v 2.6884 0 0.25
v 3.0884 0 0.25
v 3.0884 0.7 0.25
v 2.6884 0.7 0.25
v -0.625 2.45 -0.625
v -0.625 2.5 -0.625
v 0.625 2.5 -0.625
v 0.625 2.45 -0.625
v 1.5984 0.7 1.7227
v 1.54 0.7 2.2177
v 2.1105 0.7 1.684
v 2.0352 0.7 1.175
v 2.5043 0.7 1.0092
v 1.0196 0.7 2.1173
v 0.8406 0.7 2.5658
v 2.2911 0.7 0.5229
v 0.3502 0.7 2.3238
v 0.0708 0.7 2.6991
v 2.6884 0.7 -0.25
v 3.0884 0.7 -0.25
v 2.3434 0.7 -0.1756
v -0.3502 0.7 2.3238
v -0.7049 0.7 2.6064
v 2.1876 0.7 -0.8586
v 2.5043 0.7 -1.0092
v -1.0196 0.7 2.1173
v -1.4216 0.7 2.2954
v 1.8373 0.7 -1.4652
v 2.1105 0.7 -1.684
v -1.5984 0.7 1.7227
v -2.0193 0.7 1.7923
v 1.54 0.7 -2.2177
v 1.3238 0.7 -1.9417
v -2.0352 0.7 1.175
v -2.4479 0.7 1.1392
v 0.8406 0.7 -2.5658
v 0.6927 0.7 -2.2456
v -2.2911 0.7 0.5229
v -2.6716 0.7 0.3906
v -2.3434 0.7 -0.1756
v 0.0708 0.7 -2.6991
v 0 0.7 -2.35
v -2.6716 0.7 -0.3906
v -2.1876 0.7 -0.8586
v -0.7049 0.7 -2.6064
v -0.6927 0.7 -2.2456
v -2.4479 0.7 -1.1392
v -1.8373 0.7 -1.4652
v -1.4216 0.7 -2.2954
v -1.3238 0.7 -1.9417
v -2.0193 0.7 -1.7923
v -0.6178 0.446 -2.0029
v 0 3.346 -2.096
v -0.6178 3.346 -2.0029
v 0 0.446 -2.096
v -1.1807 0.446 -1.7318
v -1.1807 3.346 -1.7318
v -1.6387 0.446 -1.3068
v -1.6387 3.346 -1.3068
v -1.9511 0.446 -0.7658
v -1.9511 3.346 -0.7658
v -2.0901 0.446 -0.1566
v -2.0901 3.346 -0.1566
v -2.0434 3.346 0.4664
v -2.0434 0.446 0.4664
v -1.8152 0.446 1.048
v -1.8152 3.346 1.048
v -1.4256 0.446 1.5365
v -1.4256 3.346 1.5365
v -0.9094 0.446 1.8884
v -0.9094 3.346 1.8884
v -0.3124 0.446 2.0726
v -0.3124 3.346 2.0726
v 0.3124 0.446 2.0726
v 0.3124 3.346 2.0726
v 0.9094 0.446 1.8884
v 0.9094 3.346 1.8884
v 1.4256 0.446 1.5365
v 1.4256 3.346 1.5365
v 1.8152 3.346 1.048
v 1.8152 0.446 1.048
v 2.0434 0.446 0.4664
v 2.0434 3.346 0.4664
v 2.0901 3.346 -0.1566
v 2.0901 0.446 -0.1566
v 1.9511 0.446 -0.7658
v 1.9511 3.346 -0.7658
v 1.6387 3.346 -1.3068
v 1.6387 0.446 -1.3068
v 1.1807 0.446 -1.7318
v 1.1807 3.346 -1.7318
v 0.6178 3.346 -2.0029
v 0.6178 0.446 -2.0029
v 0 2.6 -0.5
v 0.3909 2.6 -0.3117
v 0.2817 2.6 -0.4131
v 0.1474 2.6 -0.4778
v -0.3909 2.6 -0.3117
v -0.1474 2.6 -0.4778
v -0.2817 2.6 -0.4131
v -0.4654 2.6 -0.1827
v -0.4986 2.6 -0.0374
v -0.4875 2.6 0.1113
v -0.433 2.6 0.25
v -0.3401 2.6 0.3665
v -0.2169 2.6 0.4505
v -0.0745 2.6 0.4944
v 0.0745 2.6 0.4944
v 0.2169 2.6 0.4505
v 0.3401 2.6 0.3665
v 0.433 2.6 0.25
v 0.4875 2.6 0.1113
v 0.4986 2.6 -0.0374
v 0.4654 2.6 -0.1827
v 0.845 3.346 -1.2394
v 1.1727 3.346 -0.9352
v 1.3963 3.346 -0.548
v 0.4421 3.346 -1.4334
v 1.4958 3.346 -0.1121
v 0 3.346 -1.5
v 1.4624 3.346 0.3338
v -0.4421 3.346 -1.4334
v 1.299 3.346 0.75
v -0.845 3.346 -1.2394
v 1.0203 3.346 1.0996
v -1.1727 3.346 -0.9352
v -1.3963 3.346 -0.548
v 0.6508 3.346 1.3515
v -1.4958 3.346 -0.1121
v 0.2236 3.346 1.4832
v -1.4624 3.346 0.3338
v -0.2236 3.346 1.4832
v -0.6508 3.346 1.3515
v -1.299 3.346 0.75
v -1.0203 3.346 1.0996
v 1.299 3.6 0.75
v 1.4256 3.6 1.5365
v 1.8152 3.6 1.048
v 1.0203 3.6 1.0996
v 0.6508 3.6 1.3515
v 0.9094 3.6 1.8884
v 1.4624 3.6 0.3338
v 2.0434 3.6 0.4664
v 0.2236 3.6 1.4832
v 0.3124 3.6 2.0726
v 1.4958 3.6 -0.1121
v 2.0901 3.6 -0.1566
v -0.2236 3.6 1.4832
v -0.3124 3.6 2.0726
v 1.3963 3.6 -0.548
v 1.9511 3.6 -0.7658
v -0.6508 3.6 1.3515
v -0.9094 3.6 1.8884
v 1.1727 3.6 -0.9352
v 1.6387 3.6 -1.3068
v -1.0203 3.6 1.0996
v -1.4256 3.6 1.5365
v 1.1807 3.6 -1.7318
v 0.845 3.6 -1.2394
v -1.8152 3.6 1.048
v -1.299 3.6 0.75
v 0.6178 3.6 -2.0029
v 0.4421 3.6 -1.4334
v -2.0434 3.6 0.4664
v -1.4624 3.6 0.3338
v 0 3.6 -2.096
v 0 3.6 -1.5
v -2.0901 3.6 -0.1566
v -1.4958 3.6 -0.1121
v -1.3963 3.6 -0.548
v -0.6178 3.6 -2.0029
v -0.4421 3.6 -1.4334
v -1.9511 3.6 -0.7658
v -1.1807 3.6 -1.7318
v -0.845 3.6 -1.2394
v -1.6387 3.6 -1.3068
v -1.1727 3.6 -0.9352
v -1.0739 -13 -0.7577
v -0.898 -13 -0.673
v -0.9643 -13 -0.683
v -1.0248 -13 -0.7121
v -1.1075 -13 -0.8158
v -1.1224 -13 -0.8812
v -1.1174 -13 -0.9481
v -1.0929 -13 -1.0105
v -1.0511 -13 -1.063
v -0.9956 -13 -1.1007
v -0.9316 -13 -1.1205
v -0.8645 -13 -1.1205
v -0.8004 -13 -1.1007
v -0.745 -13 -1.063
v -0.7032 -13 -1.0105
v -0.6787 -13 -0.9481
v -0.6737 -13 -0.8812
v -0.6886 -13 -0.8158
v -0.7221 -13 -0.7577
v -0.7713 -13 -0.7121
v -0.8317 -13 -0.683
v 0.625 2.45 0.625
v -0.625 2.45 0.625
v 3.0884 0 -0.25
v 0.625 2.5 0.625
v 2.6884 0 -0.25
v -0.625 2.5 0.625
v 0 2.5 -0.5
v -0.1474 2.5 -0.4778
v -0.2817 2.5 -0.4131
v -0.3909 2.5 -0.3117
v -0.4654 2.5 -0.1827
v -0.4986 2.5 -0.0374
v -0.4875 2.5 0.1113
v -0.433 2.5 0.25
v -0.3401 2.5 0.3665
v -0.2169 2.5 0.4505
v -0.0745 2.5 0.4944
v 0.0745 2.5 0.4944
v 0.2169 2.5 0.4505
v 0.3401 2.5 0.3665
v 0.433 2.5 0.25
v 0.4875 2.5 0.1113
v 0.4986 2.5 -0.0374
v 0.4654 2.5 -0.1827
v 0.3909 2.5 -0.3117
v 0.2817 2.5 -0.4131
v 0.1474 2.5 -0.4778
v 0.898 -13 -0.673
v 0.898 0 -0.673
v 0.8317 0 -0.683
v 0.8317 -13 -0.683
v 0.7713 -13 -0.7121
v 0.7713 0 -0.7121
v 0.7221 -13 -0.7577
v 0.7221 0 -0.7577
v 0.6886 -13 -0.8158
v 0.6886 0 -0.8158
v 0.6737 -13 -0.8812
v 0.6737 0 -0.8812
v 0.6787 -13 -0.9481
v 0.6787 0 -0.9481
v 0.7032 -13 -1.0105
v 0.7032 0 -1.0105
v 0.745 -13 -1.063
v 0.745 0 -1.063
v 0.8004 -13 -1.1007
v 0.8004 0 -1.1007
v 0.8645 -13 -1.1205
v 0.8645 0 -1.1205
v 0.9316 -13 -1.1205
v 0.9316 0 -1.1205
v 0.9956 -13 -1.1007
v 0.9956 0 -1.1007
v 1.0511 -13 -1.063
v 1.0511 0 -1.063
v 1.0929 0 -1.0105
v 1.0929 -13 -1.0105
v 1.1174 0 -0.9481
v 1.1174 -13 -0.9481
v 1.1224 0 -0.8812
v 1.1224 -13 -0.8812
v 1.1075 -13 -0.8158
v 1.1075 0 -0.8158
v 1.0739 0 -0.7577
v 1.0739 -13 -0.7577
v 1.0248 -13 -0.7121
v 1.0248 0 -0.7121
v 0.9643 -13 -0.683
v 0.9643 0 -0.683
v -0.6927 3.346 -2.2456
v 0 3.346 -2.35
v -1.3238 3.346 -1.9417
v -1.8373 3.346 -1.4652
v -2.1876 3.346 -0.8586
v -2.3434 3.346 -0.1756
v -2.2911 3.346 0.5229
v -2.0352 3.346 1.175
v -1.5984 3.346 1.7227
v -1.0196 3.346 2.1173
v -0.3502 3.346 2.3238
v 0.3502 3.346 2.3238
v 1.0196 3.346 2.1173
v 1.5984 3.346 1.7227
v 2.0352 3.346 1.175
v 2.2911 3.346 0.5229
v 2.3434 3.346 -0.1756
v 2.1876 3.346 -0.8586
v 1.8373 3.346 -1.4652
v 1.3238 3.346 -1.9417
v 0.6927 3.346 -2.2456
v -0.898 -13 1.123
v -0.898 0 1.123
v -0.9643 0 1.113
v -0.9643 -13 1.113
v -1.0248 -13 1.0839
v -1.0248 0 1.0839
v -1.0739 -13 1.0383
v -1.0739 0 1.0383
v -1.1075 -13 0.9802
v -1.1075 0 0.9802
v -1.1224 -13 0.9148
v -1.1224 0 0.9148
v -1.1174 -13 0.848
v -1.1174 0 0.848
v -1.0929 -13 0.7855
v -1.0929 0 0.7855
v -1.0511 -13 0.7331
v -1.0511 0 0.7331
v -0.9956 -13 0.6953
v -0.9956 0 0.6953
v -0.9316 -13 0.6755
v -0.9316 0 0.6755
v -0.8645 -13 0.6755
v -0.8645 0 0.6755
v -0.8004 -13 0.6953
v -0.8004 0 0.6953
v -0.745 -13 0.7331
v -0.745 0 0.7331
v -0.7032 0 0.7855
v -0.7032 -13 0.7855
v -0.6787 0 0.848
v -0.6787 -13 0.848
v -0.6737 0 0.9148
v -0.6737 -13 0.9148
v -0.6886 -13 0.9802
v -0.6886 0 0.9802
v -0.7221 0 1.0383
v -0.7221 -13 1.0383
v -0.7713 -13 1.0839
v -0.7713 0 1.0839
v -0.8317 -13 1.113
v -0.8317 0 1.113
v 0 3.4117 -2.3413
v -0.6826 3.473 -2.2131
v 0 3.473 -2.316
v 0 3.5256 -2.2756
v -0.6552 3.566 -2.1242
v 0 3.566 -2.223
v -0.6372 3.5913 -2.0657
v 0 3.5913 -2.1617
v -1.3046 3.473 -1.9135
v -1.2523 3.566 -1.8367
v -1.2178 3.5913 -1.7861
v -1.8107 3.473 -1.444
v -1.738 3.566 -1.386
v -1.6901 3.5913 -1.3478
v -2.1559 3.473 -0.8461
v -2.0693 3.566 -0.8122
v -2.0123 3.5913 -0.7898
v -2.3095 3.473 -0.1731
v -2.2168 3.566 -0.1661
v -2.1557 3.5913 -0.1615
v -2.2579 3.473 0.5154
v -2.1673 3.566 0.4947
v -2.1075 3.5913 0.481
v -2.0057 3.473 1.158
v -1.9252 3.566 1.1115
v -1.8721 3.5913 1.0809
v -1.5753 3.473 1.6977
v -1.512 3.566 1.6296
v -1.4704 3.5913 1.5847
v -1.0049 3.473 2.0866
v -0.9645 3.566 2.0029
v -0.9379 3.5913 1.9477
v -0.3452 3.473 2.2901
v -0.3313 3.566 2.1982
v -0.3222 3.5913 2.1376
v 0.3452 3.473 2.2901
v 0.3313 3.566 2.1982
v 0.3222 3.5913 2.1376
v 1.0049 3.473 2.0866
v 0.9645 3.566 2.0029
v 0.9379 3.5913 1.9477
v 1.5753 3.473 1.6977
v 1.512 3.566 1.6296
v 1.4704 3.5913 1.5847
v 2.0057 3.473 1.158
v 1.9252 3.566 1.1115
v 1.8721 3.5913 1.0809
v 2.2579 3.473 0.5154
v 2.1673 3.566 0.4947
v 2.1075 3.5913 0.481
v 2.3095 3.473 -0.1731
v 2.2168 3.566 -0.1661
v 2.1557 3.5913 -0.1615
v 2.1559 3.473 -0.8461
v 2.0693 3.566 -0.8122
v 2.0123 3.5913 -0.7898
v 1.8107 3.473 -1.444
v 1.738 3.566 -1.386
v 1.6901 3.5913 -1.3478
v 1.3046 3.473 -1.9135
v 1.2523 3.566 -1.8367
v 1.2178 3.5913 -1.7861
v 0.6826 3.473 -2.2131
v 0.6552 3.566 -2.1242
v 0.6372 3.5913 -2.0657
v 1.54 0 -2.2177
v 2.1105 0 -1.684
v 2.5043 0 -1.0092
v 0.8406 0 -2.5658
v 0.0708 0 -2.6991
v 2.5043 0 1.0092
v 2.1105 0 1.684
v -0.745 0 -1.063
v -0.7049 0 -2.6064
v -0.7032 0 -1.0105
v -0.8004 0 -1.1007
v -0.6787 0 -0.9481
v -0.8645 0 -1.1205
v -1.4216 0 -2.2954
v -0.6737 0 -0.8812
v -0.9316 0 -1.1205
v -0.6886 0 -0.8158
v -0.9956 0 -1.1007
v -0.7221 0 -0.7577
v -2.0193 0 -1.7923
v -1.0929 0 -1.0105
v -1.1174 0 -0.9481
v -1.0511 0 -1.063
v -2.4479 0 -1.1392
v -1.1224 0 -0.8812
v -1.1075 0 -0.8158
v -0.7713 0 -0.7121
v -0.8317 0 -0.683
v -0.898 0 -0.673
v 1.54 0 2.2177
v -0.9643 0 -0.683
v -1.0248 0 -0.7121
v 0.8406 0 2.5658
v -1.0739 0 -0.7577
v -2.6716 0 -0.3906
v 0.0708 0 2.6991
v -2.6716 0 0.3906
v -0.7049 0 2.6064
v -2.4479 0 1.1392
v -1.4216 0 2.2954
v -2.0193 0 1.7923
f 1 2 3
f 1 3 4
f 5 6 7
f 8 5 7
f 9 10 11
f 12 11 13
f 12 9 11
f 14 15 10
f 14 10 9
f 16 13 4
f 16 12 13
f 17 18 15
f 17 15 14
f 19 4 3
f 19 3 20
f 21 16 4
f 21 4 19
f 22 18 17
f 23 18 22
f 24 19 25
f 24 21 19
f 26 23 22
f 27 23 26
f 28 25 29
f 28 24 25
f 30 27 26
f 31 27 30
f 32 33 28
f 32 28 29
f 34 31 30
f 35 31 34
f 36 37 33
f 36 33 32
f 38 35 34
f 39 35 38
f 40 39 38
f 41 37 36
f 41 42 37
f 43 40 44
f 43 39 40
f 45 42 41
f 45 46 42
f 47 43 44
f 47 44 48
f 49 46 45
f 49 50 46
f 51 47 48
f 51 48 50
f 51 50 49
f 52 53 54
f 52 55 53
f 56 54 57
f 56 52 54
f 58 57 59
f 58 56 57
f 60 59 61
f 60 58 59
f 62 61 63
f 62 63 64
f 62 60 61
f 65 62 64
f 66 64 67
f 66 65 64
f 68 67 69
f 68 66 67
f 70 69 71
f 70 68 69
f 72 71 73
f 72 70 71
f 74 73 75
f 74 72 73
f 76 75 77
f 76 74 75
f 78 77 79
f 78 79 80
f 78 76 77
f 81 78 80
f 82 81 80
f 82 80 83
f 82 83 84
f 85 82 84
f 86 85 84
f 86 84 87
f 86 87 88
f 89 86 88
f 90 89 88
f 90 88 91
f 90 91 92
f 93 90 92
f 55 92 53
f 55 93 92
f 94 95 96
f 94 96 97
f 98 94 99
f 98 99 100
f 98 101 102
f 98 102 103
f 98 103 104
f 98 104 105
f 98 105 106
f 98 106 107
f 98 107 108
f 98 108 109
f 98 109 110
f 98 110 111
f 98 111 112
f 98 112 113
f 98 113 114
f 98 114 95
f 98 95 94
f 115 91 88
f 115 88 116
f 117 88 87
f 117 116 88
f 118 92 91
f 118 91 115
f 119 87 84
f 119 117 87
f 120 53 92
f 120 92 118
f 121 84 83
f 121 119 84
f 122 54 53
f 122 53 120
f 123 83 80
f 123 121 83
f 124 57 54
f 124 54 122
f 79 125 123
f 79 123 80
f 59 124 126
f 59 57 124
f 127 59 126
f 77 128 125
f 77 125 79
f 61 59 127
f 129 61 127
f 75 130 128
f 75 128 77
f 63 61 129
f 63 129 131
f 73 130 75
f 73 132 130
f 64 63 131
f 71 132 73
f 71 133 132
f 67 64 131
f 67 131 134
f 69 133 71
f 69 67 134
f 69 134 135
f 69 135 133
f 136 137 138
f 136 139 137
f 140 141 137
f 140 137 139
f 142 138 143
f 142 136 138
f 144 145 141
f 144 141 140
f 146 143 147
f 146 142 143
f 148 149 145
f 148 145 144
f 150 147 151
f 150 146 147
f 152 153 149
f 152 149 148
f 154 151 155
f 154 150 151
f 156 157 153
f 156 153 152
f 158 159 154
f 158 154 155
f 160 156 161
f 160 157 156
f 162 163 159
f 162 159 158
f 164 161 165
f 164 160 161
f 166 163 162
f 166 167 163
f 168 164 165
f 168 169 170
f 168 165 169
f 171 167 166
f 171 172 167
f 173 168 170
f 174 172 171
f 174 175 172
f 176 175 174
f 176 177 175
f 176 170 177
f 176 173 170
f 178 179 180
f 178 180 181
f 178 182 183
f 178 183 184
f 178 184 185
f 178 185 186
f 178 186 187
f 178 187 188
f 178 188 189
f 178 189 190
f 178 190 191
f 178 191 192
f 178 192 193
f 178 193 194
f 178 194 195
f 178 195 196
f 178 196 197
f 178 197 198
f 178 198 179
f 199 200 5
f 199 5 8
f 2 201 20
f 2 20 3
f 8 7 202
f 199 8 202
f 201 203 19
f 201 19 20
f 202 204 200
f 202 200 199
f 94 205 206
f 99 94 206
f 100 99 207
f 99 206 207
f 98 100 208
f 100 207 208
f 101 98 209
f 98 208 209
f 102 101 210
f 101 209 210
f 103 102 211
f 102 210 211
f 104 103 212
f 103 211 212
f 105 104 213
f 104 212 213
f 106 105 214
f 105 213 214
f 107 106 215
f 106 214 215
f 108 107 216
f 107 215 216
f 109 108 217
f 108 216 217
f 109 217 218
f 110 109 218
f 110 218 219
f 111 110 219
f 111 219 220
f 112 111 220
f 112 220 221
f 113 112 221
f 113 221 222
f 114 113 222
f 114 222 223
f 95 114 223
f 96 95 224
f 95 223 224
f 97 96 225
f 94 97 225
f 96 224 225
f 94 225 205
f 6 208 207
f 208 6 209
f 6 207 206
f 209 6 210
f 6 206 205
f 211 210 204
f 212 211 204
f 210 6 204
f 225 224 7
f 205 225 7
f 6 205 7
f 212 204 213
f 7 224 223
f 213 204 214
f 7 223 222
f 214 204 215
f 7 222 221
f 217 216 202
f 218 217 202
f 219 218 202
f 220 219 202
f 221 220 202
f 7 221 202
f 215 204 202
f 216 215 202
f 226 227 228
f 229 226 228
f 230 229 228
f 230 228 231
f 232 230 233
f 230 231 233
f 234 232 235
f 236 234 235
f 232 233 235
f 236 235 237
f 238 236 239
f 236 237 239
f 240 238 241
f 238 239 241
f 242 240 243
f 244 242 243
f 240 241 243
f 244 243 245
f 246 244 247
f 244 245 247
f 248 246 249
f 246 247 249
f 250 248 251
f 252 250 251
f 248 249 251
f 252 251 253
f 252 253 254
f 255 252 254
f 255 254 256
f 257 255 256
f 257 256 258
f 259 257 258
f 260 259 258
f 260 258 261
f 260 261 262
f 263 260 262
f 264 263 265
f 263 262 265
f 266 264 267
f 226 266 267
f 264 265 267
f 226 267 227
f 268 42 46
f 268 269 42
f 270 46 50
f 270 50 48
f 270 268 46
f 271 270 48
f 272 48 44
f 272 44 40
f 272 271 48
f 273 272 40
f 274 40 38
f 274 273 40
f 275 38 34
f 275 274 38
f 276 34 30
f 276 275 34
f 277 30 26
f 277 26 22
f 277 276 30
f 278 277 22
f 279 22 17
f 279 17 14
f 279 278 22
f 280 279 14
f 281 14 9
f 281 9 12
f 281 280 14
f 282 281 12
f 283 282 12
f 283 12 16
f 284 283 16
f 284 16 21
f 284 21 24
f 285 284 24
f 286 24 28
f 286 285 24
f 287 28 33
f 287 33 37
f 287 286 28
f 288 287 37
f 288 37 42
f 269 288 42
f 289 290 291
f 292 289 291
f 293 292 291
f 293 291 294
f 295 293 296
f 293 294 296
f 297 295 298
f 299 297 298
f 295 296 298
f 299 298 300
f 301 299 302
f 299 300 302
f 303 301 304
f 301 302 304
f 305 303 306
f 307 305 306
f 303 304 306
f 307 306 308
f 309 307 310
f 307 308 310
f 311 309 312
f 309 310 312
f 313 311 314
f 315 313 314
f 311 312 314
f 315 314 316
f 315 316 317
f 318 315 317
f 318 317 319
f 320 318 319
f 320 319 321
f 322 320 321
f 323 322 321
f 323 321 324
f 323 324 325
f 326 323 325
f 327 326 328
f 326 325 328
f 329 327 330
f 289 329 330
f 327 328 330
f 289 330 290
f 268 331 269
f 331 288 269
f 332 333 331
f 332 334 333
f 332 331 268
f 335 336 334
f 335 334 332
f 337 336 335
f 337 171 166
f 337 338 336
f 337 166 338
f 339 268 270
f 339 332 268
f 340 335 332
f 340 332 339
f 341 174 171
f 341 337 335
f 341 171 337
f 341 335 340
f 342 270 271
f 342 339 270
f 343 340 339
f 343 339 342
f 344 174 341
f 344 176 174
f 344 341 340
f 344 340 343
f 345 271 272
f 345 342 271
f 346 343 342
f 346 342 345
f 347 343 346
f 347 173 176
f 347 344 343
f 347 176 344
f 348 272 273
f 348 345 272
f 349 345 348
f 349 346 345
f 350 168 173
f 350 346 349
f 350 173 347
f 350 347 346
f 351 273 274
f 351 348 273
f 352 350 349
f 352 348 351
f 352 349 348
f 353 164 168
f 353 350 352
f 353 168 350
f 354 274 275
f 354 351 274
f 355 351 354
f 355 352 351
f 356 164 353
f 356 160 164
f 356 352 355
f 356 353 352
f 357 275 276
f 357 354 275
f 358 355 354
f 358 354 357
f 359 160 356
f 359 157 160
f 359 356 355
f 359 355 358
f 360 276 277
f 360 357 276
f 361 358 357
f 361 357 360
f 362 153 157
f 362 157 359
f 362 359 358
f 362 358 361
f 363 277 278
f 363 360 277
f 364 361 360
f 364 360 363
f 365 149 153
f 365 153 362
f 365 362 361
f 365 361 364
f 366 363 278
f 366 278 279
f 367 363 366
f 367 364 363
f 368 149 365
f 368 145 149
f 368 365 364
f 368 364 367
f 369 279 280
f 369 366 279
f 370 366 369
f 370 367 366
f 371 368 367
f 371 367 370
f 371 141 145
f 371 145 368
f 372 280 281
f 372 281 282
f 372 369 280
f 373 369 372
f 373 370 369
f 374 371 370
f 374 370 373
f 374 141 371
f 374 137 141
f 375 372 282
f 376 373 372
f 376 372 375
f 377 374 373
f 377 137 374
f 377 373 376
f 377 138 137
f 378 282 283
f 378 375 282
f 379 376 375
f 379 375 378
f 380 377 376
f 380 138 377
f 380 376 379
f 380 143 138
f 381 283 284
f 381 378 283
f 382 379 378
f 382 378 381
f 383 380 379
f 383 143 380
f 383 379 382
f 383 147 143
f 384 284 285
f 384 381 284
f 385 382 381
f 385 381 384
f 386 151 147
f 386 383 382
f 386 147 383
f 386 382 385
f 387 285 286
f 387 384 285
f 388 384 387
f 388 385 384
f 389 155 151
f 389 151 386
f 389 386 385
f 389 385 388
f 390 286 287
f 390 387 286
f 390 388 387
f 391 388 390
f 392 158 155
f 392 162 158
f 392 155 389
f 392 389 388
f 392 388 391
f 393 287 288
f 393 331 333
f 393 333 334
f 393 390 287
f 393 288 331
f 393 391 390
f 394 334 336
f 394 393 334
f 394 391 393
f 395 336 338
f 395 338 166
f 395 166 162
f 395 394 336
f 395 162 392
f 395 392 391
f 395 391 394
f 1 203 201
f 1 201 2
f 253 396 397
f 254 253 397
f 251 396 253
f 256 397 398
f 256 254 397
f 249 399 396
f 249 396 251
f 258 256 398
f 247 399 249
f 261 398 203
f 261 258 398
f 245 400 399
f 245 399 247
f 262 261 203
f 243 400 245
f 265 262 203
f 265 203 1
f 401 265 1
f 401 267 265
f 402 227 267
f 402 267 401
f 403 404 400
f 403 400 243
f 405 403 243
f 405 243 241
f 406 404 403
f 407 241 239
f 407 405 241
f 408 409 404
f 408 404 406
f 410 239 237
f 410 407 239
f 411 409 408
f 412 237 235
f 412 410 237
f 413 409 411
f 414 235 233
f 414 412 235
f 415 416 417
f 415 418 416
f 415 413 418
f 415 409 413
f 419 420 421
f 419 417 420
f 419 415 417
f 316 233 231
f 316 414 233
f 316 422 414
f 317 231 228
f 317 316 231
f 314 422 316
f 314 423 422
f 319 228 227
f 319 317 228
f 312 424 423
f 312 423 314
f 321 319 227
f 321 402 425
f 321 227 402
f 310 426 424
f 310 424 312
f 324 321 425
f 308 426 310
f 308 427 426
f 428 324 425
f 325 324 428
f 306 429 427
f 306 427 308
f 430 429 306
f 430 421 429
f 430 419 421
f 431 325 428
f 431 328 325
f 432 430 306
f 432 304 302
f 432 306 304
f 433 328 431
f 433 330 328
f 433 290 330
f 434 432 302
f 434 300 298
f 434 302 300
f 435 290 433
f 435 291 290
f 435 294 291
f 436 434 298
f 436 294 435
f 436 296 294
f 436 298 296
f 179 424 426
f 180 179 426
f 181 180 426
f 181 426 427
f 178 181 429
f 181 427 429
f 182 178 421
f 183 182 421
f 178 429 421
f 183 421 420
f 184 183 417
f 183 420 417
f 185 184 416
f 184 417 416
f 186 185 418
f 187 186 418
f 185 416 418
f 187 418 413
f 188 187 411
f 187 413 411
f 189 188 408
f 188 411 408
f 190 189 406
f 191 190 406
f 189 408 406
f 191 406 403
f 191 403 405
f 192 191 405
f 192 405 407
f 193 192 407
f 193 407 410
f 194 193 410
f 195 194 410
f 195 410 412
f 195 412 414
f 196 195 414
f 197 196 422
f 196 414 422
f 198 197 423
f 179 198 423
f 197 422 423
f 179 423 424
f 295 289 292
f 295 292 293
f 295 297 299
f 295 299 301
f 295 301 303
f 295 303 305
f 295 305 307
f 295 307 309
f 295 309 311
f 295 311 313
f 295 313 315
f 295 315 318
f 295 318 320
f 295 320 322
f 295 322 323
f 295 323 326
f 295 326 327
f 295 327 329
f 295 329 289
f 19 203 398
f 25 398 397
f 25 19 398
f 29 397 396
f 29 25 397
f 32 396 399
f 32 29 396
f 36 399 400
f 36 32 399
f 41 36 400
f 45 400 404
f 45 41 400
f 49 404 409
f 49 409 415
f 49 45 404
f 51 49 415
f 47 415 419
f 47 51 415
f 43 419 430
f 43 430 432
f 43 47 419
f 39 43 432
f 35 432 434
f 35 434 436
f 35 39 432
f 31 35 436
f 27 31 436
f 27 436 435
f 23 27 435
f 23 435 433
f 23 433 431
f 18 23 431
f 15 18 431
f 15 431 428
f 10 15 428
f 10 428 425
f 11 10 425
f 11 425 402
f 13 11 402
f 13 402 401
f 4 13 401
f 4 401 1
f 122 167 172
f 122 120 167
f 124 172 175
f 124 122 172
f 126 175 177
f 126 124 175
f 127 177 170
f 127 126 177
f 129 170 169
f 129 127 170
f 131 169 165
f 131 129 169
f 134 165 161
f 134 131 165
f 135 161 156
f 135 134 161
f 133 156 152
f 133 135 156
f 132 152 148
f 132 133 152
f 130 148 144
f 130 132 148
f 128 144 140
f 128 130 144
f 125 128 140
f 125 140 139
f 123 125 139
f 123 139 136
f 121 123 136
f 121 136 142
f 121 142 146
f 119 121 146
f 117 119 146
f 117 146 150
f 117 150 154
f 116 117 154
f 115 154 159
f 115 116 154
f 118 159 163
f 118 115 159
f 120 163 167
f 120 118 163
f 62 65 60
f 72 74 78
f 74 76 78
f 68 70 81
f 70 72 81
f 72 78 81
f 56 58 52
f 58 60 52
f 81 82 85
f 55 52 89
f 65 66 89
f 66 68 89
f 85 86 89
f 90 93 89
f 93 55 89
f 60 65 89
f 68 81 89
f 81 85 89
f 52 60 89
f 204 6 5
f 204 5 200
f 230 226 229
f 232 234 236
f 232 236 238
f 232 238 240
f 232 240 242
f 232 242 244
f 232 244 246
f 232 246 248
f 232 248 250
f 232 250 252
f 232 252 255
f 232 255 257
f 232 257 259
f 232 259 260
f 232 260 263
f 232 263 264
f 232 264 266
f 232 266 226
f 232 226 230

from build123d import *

# Parameters (mm, degrees)
SKETCH2_R           = 2.7
BOSS_EXTRUDE1_DEPTH = 0.446
BOSS_EXTRUDE2_START = -2.5
SKETCH3_W           = 1.25
SKETCH3_H           = 1.25
BOSS_EXTRUDE2_DEPTH = 0.05
SKETCH8_R           = 0.5
BOSS_EXTRUDE6_DEPTH = 0.1
BOSS_EXTRUDE8_DEPTH = 0.7
SKETCH5_R           = 0.225
BOSS_EXTRUDE4_DEPTH = 13


with BuildPart() as part:
    # Sketch1 → Revolve-Thin2 (revolve)
    with BuildSketch(Plane.XY, mode=Mode.PRIVATE) as revolve_thin2_sk:
        with BuildLine():
            Line((2.7, 0), (2.7, 0.7))
            Line((2.7, 0.7), (2.35, 0.7))
            Line((2.35, 0.7), (2.35, 3.346))
            ThreePointArc((2.35, 3.346), (2.275605122, 3.525605122), (2.096, 3.6))
            Line((2.096, 3.6), (1.5, 3.6))
            Line((1.5, 3.6), (1.5, 3.346))
            Line((1.5, 3.346), (2.096, 3.346))
            Line((2.096, 3.346), (2.096, 0.446))
            Line((2.096, 0.446), (2.446, 0.446))
            Line((2.446, 0.446), (2.446, 0))
            Line((2.446, 0), (2.7, 0))
        make_face()
    revolve(revolve_thin2_sk.sketch.rotate(Axis((0, 0, 0), (0, 1, 0)), 90), axis=Axis((0, 0, 0), (0, 1, 0)))  # turned: the seam where the file's is

    # Sketch2 → Boss-Extrude1 (add)
    with BuildSketch(Plane.XZ):
        with Locations(Location((0, 0, 0), (0, 0, 270))):  # turned: the seam where the file's is
            Circle(SKETCH2_R)
    extrude(amount=-BOSS_EXTRUDE1_DEPTH)

    # Sketch11 → Boss-Extrude8 (add)
    with BuildSketch(Plane.XZ):
        with BuildLine():
            Line((3.088401012, -0.25), (3.088401012, 0))
            Line((3.088401012, 0), (3.088401012, 0.25))
            Line((3.088401012, 0.25), (2.688401012, 0.25))
            ThreePointArc((2.688401012, 0.25), (2.697098694, 0.125134464), (2.7, 0))
            ThreePointArc((2.7, 0), (2.697098694, -0.125134464), (2.688401012, -0.25))
            Line((2.688401012, -0.25), (3.088401012, -0.25))
        make_face()
    extrude(amount=-BOSS_EXTRUDE8_DEPTH)

    # Sketch5 → Boss-Extrude4 (add)
    with BuildSketch(Plane.XZ):
        with Locations(Location((0.898025612, -0.898025612, 0), (0, 0, 90))):  # turned: the seam where the file's is
            Circle(SKETCH5_R)
        with Locations(Location((-0.898025612, 0.898025612, 0), (0, 0, 90))):  # turned: the seam where the file's is
            Circle(SKETCH5_R)
        with Locations(Location((-0.898025612, -0.898025612, 0), (0, 0, 90))):  # turned: the seam where the file's is
            Circle(SKETCH5_R)
    extrude(amount=BOSS_EXTRUDE4_DEPTH)


with BuildPart() as body_2:
    # Sketch3 → Boss-Extrude2 (new body)
    with BuildSketch(Plane.XZ.offset(BOSS_EXTRUDE2_START)):
        Rectangle(SKETCH3_W, SKETCH3_H)
    extrude(amount=BOSS_EXTRUDE2_DEPTH)

    # Sketch8 → Boss-Extrude6 (add)
    with BuildSketch(Plane(origin=(0, 2.5, 0), x_dir=(-1, 0, 0), z_dir=(0, 1, 0))):
        with Locations(Location((0, 0, 0), (0, 0, 270))):  # turned: the seam where the file's is
            Circle(SKETCH8_R)
    extrude(amount=BOSS_EXTRUDE6_DEPTH)


solid = Compound([part.part, body_2.part])
